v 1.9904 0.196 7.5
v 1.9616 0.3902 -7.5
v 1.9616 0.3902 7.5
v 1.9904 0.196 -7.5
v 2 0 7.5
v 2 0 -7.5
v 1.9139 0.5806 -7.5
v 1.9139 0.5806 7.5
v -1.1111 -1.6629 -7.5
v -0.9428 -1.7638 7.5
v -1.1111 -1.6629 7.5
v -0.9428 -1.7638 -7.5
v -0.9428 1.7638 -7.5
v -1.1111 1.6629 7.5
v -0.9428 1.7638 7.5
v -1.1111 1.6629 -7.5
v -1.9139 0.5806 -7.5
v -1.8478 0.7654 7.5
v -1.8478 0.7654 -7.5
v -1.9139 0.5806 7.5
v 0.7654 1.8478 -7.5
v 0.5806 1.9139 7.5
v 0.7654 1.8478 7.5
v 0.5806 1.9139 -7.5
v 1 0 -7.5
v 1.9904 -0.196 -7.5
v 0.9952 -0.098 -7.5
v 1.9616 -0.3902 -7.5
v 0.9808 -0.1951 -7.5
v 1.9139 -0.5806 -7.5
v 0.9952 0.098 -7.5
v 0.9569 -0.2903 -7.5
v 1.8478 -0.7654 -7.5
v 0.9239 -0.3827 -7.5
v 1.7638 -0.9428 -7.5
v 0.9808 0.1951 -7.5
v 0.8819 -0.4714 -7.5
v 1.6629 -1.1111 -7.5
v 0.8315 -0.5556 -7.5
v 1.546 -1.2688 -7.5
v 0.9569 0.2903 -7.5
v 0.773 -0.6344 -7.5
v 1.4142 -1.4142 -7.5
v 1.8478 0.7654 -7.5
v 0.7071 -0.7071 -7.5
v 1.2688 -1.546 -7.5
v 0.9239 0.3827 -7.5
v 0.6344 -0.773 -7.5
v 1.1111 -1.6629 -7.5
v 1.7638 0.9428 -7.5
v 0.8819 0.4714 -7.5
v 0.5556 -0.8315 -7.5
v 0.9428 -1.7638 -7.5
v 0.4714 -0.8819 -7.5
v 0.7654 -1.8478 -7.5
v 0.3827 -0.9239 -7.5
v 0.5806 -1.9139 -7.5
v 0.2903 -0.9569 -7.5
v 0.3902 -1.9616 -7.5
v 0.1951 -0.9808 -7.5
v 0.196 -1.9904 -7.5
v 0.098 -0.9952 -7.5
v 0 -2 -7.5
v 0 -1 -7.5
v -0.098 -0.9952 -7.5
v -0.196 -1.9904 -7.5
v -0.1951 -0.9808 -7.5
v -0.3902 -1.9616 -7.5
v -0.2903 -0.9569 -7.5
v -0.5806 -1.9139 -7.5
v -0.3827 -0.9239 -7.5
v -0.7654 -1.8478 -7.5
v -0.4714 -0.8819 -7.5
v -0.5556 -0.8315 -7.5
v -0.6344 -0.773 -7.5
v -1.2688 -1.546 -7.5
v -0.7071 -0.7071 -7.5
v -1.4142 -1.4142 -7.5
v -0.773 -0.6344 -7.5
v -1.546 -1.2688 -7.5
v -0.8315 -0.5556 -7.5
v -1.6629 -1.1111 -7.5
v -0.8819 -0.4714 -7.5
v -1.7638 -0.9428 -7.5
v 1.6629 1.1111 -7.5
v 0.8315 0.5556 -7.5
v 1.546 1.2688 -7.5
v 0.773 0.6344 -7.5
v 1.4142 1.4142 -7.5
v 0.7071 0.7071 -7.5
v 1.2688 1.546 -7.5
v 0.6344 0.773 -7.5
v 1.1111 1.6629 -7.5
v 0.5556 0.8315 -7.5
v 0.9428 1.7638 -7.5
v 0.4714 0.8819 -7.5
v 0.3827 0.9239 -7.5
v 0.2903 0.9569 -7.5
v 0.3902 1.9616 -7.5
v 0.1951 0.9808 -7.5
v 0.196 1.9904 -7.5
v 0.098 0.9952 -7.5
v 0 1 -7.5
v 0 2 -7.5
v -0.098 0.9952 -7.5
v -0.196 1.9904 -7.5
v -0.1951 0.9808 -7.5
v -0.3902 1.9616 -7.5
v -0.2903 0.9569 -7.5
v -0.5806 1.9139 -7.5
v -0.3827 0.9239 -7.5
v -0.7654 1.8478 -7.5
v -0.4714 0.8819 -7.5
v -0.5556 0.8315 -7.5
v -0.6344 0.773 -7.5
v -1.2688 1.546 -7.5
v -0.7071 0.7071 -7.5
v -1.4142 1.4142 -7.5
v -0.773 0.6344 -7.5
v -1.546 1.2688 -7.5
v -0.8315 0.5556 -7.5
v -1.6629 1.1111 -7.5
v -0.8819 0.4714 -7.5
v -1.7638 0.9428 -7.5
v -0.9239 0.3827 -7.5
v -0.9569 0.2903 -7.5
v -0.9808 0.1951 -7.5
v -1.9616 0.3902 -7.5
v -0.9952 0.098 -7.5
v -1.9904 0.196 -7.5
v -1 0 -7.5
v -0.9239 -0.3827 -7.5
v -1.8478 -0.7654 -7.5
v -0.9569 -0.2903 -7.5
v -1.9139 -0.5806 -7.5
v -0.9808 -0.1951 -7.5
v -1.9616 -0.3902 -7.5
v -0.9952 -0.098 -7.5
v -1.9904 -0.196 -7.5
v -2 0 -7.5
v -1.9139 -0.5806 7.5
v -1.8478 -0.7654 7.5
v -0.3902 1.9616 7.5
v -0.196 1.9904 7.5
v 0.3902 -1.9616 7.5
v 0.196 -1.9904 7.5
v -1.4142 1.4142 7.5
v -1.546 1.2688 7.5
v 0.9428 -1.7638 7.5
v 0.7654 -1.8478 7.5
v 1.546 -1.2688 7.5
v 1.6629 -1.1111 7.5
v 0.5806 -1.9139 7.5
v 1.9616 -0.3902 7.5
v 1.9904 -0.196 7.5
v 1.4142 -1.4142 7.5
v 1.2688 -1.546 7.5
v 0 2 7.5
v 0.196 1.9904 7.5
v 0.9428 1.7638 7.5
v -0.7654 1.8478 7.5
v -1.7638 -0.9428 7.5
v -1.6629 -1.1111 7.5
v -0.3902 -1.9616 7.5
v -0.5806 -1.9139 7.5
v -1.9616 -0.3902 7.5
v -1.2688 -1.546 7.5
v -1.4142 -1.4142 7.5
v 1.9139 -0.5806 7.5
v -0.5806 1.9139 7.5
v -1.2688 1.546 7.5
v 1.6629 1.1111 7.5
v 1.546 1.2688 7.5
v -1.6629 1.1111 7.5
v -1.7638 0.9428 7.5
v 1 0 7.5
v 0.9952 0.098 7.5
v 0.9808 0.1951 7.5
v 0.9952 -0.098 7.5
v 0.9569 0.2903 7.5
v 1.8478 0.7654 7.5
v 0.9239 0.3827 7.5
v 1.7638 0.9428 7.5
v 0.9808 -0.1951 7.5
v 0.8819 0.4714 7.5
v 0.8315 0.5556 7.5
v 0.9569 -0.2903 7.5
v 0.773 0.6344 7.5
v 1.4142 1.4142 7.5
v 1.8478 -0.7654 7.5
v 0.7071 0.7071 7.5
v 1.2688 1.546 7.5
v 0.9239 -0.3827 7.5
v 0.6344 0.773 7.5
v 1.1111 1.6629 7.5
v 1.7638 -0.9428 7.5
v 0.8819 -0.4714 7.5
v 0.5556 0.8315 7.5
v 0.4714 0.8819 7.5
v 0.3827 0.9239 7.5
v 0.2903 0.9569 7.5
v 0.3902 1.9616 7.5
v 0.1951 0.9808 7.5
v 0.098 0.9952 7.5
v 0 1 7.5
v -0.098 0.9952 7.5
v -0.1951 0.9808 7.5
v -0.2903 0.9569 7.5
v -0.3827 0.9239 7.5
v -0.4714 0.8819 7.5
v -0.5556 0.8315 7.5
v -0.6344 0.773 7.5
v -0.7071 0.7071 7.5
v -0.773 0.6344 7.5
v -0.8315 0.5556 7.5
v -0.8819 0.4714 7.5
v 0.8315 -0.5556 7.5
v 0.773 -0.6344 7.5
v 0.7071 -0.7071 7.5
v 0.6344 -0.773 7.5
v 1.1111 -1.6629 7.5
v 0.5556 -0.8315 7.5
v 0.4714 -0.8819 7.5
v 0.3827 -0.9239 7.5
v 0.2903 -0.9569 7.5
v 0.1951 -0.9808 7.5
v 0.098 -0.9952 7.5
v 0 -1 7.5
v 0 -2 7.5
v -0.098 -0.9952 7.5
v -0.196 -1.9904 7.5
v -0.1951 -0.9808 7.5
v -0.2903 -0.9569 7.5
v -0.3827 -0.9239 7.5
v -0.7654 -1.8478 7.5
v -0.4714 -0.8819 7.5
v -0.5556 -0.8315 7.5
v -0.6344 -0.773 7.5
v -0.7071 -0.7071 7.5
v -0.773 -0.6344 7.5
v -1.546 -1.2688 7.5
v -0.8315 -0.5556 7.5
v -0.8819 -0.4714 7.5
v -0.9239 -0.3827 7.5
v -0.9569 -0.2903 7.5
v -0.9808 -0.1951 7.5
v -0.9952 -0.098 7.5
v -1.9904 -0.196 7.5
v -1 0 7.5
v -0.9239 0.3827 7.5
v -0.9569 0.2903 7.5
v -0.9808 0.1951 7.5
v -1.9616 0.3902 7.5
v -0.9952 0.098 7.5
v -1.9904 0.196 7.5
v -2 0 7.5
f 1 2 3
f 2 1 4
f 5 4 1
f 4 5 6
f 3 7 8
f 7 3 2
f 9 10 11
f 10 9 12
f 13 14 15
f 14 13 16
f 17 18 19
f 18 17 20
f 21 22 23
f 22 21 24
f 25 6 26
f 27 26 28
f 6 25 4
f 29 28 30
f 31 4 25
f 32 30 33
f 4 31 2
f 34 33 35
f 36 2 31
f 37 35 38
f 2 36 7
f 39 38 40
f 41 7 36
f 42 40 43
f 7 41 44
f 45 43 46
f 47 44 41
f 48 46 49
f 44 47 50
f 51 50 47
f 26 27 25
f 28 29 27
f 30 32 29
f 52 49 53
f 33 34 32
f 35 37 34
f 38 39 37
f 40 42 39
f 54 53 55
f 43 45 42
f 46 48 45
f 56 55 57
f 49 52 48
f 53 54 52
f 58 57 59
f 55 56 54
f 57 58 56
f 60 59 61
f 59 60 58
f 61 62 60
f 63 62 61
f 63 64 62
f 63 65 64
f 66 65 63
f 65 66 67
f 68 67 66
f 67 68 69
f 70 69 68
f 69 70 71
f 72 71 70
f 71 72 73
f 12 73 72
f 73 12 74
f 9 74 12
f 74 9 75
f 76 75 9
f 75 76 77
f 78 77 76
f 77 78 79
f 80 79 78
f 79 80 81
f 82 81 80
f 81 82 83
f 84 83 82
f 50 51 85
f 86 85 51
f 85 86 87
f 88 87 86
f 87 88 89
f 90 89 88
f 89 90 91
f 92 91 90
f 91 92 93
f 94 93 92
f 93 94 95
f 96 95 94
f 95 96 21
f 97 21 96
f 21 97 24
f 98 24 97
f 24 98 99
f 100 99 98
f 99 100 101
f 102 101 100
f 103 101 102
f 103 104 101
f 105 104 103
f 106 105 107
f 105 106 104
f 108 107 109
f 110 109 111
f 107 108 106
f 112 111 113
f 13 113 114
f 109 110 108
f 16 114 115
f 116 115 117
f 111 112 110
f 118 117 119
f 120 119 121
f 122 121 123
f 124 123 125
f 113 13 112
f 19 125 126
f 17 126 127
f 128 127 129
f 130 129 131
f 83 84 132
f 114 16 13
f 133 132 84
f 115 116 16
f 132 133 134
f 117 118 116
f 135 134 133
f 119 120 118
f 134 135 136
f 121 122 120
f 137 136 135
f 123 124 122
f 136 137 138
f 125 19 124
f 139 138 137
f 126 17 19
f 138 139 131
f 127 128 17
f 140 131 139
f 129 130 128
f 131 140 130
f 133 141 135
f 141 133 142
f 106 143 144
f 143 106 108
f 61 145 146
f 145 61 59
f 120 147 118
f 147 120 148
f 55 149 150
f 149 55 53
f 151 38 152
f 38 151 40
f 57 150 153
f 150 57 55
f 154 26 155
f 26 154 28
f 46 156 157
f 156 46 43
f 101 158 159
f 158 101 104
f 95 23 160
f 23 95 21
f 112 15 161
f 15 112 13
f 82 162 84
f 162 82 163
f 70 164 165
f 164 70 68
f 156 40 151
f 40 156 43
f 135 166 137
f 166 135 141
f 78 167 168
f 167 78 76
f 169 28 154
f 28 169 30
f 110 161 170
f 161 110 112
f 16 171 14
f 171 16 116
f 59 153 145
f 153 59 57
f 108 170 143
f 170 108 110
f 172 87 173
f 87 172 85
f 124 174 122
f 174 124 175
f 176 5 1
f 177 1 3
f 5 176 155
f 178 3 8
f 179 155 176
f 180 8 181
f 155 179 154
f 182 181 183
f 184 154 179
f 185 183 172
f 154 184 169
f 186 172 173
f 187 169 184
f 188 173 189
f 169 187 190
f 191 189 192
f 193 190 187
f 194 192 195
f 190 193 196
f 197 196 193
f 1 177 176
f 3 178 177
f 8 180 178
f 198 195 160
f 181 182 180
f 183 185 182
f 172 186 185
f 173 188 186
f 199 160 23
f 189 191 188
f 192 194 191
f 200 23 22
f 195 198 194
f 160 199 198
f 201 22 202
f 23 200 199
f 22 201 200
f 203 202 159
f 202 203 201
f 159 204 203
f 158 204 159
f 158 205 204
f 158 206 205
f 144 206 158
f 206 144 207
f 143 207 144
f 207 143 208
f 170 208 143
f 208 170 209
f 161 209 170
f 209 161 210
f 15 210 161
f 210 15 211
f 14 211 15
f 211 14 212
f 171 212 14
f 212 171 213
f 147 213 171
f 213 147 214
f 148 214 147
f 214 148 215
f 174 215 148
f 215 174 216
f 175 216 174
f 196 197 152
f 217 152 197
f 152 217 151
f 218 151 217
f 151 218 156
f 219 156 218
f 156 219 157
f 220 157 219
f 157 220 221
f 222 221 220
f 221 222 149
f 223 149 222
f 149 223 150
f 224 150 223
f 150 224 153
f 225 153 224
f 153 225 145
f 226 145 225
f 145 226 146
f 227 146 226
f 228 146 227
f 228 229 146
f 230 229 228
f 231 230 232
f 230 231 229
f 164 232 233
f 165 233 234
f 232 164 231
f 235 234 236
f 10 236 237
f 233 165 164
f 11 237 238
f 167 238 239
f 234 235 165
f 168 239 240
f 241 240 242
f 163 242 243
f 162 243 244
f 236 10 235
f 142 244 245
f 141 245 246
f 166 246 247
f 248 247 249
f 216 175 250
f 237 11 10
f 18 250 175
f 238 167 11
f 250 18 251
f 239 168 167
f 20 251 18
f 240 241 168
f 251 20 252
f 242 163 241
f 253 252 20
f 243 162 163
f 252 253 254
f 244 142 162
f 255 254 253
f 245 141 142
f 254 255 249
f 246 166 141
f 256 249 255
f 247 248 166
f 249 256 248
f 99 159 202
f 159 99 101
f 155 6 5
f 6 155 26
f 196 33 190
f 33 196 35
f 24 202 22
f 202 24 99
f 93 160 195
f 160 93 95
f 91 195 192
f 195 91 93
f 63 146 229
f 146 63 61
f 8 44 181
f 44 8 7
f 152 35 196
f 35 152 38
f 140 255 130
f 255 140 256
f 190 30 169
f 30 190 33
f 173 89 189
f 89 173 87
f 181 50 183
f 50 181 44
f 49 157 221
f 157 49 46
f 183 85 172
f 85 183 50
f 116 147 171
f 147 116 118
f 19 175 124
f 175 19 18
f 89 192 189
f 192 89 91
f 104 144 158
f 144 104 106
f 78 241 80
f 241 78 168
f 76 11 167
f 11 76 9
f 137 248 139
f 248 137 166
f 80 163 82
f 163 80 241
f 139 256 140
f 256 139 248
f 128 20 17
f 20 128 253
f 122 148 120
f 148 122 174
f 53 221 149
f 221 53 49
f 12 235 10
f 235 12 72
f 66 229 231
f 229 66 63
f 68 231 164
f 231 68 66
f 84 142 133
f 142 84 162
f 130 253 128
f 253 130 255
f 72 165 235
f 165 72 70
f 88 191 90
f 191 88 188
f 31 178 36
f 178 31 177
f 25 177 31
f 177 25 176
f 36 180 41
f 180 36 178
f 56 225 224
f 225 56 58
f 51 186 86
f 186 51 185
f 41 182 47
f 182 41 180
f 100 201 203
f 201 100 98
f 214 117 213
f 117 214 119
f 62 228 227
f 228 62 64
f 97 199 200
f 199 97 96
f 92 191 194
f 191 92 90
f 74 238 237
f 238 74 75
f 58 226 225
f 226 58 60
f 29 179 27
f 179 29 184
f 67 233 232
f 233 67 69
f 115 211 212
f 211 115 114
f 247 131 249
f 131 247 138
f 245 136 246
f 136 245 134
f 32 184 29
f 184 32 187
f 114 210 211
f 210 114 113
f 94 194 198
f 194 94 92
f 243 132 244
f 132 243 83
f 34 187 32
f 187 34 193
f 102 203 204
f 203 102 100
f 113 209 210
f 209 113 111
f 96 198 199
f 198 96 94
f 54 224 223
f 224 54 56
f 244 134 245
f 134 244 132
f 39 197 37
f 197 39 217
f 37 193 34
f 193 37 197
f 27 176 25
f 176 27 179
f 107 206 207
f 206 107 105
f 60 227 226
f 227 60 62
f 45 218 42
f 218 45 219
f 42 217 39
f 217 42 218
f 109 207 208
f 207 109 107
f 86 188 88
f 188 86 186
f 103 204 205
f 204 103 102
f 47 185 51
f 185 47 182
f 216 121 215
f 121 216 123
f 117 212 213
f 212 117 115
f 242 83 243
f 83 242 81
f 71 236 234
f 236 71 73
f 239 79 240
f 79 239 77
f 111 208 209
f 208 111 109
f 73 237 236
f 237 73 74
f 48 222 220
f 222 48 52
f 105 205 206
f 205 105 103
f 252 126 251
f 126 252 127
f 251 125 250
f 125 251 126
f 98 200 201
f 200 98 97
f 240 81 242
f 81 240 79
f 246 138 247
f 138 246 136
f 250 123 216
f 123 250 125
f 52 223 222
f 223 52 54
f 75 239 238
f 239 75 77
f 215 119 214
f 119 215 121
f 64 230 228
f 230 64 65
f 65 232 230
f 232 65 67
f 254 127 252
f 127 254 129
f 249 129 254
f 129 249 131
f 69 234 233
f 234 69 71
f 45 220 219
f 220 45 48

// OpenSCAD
// Parameters
length = 15; //[5:60:1]
forced_id = 0; //[0:10:0.1]
center = true; //[0:1:1]
od = 4; //[2:12:0.1]
id_nominal = 2; //[1:10:0.1]
overlap = 1; //[0.5:2:0.1]

// Tubing - complete geometry
module tubing() {
  color([0.85, 0.85, 0.8]) { // Off-white for PTFE
    difference() {
      // Outer tube
      cylinder(r=od/2, h=length, center=center, $fn=64);
      // Inner bore
      cylinder(r=((forced_id > 0) ? forced_id : id_nominal) / 2, h=length + 2 * overlap, center=center, $fn=64);
    }
  }
}

// Assembly
module assembly() {
  tubing();
}

assembly();
